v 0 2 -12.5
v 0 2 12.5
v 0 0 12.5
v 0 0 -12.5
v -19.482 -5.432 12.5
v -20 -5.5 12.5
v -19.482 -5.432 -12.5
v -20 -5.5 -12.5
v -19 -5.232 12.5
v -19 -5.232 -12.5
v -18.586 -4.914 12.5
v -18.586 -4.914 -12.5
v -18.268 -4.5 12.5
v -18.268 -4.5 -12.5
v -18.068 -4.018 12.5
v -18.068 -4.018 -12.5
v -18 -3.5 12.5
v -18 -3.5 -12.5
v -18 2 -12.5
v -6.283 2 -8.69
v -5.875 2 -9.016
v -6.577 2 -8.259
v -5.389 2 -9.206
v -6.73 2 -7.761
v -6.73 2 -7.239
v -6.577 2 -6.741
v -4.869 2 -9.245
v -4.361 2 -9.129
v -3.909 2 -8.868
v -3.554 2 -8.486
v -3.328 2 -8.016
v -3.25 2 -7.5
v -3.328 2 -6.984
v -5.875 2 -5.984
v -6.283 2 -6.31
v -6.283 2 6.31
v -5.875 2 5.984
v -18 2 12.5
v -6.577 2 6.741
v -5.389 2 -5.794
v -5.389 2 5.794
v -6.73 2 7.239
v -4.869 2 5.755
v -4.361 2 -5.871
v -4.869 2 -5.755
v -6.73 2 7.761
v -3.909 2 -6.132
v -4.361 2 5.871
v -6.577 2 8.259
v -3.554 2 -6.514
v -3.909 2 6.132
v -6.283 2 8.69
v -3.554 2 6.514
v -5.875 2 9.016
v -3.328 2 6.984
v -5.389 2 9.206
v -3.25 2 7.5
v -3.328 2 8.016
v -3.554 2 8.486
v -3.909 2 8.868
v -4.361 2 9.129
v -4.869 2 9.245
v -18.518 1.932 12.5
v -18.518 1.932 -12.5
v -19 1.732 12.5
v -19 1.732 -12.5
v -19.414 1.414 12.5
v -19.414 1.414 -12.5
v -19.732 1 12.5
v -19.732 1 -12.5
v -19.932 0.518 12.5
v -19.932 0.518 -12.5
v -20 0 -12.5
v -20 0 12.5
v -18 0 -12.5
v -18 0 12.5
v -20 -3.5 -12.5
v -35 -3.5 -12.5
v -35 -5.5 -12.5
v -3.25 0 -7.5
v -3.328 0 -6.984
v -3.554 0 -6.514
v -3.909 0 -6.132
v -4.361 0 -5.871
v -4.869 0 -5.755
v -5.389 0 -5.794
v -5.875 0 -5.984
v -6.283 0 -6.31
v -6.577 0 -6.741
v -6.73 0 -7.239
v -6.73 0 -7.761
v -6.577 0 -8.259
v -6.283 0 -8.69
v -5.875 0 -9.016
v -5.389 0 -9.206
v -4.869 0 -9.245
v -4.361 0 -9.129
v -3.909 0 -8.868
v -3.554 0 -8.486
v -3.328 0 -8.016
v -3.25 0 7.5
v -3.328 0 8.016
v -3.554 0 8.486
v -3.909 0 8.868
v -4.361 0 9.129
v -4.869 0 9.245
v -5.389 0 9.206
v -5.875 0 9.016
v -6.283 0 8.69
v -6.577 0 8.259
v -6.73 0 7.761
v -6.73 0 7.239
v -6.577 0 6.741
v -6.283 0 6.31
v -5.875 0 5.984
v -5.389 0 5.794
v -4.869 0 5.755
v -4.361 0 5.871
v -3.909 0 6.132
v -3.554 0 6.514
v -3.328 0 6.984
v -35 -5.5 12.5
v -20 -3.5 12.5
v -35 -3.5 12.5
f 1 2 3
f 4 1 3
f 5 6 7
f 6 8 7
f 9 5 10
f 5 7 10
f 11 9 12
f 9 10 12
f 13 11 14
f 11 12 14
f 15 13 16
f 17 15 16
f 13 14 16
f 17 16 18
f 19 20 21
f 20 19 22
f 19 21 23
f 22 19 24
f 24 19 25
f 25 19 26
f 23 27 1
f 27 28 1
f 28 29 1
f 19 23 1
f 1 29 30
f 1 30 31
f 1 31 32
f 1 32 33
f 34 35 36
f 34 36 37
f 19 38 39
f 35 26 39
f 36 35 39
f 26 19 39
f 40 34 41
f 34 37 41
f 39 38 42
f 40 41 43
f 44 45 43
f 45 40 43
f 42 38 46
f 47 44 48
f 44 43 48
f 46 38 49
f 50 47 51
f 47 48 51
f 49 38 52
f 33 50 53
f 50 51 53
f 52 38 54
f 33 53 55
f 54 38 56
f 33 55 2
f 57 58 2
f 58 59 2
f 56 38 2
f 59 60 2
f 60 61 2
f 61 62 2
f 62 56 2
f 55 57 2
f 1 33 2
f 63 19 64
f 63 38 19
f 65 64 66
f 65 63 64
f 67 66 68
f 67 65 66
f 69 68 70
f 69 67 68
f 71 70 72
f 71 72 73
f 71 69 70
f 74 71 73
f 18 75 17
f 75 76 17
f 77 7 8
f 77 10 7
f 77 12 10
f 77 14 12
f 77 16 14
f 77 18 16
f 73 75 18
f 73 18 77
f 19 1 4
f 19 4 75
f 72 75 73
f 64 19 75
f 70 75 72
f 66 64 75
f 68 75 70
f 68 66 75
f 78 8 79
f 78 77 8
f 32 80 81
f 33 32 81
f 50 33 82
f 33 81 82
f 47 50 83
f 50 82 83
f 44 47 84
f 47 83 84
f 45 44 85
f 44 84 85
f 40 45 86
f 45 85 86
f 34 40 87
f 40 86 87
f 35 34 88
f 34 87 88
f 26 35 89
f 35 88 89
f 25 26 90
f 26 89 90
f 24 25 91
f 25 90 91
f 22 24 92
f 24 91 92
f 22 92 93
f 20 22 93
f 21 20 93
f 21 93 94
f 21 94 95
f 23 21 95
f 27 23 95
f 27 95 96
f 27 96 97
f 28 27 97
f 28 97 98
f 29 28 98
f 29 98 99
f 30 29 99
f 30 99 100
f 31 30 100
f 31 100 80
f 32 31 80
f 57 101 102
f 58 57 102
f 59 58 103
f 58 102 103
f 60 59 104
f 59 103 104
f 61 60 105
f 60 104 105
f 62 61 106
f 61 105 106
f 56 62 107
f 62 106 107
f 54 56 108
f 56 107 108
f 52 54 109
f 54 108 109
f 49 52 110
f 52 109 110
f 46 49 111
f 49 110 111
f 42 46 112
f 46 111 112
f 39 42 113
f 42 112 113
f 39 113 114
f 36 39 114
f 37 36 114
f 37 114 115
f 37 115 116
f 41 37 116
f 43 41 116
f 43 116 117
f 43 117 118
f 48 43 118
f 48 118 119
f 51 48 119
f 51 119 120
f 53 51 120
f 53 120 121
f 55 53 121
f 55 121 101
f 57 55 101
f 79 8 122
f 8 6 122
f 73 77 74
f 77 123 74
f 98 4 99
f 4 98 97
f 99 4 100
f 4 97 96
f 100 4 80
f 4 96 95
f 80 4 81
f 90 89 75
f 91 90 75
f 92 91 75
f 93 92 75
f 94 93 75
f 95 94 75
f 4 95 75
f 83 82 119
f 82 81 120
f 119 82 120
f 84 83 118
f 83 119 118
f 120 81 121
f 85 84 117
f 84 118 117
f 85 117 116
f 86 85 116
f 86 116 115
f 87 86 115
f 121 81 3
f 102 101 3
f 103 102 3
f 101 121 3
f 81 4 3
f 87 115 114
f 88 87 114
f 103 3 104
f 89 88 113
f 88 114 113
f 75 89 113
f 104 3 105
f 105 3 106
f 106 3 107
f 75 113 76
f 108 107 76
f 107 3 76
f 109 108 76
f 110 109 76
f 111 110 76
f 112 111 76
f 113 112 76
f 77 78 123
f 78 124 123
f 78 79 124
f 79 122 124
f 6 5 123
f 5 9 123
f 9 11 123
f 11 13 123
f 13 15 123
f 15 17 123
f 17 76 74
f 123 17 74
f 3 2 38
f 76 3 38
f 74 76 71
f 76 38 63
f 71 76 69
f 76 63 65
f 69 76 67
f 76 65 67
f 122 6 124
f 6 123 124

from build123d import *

# Parameters (mm, degrees)
BOSS_EXTRUDE1_DEPTH        = 12.5
FILLET1_R                  = 2
F_3_5_3_5_DIAMETER_HOLE1_D = 3.5


with BuildPart() as part:
    # Sketch1 → Boss-Extrude1 (new body, symmetric)
    with BuildSketch(Plane.XY):
        Polygon((0, 0), (-18, 0), (-18, -5.5), (-35, -5.5), (-35, -3.5), (-20, -3.5), (-20, 2), (0, 2), align=None)
    extrude(amount=BOSS_EXTRUDE1_DEPTH, both=True)

    # Fillet1
    fillet1_edges = [part.edges().sort_by_distance(p)[0] for p in [
        (-18, -5.5, 0),
        (-20, 2, 0),
    ]]
    fillet(fillet1_edges, radius=FILLET1_R)

    # Ø3.5 (3.5) Diameter Hole1 (through all)
    with Locations(Plane(origin=(0, 2, 0), x_dir=(-1, 0, 0), z_dir=(0, 1, 0))):
        with Locations((5, -7.5), (5, 7.5)):
            Hole(F_3_5_3_5_DIAMETER_HOLE1_D / 2)


solid = part.part
